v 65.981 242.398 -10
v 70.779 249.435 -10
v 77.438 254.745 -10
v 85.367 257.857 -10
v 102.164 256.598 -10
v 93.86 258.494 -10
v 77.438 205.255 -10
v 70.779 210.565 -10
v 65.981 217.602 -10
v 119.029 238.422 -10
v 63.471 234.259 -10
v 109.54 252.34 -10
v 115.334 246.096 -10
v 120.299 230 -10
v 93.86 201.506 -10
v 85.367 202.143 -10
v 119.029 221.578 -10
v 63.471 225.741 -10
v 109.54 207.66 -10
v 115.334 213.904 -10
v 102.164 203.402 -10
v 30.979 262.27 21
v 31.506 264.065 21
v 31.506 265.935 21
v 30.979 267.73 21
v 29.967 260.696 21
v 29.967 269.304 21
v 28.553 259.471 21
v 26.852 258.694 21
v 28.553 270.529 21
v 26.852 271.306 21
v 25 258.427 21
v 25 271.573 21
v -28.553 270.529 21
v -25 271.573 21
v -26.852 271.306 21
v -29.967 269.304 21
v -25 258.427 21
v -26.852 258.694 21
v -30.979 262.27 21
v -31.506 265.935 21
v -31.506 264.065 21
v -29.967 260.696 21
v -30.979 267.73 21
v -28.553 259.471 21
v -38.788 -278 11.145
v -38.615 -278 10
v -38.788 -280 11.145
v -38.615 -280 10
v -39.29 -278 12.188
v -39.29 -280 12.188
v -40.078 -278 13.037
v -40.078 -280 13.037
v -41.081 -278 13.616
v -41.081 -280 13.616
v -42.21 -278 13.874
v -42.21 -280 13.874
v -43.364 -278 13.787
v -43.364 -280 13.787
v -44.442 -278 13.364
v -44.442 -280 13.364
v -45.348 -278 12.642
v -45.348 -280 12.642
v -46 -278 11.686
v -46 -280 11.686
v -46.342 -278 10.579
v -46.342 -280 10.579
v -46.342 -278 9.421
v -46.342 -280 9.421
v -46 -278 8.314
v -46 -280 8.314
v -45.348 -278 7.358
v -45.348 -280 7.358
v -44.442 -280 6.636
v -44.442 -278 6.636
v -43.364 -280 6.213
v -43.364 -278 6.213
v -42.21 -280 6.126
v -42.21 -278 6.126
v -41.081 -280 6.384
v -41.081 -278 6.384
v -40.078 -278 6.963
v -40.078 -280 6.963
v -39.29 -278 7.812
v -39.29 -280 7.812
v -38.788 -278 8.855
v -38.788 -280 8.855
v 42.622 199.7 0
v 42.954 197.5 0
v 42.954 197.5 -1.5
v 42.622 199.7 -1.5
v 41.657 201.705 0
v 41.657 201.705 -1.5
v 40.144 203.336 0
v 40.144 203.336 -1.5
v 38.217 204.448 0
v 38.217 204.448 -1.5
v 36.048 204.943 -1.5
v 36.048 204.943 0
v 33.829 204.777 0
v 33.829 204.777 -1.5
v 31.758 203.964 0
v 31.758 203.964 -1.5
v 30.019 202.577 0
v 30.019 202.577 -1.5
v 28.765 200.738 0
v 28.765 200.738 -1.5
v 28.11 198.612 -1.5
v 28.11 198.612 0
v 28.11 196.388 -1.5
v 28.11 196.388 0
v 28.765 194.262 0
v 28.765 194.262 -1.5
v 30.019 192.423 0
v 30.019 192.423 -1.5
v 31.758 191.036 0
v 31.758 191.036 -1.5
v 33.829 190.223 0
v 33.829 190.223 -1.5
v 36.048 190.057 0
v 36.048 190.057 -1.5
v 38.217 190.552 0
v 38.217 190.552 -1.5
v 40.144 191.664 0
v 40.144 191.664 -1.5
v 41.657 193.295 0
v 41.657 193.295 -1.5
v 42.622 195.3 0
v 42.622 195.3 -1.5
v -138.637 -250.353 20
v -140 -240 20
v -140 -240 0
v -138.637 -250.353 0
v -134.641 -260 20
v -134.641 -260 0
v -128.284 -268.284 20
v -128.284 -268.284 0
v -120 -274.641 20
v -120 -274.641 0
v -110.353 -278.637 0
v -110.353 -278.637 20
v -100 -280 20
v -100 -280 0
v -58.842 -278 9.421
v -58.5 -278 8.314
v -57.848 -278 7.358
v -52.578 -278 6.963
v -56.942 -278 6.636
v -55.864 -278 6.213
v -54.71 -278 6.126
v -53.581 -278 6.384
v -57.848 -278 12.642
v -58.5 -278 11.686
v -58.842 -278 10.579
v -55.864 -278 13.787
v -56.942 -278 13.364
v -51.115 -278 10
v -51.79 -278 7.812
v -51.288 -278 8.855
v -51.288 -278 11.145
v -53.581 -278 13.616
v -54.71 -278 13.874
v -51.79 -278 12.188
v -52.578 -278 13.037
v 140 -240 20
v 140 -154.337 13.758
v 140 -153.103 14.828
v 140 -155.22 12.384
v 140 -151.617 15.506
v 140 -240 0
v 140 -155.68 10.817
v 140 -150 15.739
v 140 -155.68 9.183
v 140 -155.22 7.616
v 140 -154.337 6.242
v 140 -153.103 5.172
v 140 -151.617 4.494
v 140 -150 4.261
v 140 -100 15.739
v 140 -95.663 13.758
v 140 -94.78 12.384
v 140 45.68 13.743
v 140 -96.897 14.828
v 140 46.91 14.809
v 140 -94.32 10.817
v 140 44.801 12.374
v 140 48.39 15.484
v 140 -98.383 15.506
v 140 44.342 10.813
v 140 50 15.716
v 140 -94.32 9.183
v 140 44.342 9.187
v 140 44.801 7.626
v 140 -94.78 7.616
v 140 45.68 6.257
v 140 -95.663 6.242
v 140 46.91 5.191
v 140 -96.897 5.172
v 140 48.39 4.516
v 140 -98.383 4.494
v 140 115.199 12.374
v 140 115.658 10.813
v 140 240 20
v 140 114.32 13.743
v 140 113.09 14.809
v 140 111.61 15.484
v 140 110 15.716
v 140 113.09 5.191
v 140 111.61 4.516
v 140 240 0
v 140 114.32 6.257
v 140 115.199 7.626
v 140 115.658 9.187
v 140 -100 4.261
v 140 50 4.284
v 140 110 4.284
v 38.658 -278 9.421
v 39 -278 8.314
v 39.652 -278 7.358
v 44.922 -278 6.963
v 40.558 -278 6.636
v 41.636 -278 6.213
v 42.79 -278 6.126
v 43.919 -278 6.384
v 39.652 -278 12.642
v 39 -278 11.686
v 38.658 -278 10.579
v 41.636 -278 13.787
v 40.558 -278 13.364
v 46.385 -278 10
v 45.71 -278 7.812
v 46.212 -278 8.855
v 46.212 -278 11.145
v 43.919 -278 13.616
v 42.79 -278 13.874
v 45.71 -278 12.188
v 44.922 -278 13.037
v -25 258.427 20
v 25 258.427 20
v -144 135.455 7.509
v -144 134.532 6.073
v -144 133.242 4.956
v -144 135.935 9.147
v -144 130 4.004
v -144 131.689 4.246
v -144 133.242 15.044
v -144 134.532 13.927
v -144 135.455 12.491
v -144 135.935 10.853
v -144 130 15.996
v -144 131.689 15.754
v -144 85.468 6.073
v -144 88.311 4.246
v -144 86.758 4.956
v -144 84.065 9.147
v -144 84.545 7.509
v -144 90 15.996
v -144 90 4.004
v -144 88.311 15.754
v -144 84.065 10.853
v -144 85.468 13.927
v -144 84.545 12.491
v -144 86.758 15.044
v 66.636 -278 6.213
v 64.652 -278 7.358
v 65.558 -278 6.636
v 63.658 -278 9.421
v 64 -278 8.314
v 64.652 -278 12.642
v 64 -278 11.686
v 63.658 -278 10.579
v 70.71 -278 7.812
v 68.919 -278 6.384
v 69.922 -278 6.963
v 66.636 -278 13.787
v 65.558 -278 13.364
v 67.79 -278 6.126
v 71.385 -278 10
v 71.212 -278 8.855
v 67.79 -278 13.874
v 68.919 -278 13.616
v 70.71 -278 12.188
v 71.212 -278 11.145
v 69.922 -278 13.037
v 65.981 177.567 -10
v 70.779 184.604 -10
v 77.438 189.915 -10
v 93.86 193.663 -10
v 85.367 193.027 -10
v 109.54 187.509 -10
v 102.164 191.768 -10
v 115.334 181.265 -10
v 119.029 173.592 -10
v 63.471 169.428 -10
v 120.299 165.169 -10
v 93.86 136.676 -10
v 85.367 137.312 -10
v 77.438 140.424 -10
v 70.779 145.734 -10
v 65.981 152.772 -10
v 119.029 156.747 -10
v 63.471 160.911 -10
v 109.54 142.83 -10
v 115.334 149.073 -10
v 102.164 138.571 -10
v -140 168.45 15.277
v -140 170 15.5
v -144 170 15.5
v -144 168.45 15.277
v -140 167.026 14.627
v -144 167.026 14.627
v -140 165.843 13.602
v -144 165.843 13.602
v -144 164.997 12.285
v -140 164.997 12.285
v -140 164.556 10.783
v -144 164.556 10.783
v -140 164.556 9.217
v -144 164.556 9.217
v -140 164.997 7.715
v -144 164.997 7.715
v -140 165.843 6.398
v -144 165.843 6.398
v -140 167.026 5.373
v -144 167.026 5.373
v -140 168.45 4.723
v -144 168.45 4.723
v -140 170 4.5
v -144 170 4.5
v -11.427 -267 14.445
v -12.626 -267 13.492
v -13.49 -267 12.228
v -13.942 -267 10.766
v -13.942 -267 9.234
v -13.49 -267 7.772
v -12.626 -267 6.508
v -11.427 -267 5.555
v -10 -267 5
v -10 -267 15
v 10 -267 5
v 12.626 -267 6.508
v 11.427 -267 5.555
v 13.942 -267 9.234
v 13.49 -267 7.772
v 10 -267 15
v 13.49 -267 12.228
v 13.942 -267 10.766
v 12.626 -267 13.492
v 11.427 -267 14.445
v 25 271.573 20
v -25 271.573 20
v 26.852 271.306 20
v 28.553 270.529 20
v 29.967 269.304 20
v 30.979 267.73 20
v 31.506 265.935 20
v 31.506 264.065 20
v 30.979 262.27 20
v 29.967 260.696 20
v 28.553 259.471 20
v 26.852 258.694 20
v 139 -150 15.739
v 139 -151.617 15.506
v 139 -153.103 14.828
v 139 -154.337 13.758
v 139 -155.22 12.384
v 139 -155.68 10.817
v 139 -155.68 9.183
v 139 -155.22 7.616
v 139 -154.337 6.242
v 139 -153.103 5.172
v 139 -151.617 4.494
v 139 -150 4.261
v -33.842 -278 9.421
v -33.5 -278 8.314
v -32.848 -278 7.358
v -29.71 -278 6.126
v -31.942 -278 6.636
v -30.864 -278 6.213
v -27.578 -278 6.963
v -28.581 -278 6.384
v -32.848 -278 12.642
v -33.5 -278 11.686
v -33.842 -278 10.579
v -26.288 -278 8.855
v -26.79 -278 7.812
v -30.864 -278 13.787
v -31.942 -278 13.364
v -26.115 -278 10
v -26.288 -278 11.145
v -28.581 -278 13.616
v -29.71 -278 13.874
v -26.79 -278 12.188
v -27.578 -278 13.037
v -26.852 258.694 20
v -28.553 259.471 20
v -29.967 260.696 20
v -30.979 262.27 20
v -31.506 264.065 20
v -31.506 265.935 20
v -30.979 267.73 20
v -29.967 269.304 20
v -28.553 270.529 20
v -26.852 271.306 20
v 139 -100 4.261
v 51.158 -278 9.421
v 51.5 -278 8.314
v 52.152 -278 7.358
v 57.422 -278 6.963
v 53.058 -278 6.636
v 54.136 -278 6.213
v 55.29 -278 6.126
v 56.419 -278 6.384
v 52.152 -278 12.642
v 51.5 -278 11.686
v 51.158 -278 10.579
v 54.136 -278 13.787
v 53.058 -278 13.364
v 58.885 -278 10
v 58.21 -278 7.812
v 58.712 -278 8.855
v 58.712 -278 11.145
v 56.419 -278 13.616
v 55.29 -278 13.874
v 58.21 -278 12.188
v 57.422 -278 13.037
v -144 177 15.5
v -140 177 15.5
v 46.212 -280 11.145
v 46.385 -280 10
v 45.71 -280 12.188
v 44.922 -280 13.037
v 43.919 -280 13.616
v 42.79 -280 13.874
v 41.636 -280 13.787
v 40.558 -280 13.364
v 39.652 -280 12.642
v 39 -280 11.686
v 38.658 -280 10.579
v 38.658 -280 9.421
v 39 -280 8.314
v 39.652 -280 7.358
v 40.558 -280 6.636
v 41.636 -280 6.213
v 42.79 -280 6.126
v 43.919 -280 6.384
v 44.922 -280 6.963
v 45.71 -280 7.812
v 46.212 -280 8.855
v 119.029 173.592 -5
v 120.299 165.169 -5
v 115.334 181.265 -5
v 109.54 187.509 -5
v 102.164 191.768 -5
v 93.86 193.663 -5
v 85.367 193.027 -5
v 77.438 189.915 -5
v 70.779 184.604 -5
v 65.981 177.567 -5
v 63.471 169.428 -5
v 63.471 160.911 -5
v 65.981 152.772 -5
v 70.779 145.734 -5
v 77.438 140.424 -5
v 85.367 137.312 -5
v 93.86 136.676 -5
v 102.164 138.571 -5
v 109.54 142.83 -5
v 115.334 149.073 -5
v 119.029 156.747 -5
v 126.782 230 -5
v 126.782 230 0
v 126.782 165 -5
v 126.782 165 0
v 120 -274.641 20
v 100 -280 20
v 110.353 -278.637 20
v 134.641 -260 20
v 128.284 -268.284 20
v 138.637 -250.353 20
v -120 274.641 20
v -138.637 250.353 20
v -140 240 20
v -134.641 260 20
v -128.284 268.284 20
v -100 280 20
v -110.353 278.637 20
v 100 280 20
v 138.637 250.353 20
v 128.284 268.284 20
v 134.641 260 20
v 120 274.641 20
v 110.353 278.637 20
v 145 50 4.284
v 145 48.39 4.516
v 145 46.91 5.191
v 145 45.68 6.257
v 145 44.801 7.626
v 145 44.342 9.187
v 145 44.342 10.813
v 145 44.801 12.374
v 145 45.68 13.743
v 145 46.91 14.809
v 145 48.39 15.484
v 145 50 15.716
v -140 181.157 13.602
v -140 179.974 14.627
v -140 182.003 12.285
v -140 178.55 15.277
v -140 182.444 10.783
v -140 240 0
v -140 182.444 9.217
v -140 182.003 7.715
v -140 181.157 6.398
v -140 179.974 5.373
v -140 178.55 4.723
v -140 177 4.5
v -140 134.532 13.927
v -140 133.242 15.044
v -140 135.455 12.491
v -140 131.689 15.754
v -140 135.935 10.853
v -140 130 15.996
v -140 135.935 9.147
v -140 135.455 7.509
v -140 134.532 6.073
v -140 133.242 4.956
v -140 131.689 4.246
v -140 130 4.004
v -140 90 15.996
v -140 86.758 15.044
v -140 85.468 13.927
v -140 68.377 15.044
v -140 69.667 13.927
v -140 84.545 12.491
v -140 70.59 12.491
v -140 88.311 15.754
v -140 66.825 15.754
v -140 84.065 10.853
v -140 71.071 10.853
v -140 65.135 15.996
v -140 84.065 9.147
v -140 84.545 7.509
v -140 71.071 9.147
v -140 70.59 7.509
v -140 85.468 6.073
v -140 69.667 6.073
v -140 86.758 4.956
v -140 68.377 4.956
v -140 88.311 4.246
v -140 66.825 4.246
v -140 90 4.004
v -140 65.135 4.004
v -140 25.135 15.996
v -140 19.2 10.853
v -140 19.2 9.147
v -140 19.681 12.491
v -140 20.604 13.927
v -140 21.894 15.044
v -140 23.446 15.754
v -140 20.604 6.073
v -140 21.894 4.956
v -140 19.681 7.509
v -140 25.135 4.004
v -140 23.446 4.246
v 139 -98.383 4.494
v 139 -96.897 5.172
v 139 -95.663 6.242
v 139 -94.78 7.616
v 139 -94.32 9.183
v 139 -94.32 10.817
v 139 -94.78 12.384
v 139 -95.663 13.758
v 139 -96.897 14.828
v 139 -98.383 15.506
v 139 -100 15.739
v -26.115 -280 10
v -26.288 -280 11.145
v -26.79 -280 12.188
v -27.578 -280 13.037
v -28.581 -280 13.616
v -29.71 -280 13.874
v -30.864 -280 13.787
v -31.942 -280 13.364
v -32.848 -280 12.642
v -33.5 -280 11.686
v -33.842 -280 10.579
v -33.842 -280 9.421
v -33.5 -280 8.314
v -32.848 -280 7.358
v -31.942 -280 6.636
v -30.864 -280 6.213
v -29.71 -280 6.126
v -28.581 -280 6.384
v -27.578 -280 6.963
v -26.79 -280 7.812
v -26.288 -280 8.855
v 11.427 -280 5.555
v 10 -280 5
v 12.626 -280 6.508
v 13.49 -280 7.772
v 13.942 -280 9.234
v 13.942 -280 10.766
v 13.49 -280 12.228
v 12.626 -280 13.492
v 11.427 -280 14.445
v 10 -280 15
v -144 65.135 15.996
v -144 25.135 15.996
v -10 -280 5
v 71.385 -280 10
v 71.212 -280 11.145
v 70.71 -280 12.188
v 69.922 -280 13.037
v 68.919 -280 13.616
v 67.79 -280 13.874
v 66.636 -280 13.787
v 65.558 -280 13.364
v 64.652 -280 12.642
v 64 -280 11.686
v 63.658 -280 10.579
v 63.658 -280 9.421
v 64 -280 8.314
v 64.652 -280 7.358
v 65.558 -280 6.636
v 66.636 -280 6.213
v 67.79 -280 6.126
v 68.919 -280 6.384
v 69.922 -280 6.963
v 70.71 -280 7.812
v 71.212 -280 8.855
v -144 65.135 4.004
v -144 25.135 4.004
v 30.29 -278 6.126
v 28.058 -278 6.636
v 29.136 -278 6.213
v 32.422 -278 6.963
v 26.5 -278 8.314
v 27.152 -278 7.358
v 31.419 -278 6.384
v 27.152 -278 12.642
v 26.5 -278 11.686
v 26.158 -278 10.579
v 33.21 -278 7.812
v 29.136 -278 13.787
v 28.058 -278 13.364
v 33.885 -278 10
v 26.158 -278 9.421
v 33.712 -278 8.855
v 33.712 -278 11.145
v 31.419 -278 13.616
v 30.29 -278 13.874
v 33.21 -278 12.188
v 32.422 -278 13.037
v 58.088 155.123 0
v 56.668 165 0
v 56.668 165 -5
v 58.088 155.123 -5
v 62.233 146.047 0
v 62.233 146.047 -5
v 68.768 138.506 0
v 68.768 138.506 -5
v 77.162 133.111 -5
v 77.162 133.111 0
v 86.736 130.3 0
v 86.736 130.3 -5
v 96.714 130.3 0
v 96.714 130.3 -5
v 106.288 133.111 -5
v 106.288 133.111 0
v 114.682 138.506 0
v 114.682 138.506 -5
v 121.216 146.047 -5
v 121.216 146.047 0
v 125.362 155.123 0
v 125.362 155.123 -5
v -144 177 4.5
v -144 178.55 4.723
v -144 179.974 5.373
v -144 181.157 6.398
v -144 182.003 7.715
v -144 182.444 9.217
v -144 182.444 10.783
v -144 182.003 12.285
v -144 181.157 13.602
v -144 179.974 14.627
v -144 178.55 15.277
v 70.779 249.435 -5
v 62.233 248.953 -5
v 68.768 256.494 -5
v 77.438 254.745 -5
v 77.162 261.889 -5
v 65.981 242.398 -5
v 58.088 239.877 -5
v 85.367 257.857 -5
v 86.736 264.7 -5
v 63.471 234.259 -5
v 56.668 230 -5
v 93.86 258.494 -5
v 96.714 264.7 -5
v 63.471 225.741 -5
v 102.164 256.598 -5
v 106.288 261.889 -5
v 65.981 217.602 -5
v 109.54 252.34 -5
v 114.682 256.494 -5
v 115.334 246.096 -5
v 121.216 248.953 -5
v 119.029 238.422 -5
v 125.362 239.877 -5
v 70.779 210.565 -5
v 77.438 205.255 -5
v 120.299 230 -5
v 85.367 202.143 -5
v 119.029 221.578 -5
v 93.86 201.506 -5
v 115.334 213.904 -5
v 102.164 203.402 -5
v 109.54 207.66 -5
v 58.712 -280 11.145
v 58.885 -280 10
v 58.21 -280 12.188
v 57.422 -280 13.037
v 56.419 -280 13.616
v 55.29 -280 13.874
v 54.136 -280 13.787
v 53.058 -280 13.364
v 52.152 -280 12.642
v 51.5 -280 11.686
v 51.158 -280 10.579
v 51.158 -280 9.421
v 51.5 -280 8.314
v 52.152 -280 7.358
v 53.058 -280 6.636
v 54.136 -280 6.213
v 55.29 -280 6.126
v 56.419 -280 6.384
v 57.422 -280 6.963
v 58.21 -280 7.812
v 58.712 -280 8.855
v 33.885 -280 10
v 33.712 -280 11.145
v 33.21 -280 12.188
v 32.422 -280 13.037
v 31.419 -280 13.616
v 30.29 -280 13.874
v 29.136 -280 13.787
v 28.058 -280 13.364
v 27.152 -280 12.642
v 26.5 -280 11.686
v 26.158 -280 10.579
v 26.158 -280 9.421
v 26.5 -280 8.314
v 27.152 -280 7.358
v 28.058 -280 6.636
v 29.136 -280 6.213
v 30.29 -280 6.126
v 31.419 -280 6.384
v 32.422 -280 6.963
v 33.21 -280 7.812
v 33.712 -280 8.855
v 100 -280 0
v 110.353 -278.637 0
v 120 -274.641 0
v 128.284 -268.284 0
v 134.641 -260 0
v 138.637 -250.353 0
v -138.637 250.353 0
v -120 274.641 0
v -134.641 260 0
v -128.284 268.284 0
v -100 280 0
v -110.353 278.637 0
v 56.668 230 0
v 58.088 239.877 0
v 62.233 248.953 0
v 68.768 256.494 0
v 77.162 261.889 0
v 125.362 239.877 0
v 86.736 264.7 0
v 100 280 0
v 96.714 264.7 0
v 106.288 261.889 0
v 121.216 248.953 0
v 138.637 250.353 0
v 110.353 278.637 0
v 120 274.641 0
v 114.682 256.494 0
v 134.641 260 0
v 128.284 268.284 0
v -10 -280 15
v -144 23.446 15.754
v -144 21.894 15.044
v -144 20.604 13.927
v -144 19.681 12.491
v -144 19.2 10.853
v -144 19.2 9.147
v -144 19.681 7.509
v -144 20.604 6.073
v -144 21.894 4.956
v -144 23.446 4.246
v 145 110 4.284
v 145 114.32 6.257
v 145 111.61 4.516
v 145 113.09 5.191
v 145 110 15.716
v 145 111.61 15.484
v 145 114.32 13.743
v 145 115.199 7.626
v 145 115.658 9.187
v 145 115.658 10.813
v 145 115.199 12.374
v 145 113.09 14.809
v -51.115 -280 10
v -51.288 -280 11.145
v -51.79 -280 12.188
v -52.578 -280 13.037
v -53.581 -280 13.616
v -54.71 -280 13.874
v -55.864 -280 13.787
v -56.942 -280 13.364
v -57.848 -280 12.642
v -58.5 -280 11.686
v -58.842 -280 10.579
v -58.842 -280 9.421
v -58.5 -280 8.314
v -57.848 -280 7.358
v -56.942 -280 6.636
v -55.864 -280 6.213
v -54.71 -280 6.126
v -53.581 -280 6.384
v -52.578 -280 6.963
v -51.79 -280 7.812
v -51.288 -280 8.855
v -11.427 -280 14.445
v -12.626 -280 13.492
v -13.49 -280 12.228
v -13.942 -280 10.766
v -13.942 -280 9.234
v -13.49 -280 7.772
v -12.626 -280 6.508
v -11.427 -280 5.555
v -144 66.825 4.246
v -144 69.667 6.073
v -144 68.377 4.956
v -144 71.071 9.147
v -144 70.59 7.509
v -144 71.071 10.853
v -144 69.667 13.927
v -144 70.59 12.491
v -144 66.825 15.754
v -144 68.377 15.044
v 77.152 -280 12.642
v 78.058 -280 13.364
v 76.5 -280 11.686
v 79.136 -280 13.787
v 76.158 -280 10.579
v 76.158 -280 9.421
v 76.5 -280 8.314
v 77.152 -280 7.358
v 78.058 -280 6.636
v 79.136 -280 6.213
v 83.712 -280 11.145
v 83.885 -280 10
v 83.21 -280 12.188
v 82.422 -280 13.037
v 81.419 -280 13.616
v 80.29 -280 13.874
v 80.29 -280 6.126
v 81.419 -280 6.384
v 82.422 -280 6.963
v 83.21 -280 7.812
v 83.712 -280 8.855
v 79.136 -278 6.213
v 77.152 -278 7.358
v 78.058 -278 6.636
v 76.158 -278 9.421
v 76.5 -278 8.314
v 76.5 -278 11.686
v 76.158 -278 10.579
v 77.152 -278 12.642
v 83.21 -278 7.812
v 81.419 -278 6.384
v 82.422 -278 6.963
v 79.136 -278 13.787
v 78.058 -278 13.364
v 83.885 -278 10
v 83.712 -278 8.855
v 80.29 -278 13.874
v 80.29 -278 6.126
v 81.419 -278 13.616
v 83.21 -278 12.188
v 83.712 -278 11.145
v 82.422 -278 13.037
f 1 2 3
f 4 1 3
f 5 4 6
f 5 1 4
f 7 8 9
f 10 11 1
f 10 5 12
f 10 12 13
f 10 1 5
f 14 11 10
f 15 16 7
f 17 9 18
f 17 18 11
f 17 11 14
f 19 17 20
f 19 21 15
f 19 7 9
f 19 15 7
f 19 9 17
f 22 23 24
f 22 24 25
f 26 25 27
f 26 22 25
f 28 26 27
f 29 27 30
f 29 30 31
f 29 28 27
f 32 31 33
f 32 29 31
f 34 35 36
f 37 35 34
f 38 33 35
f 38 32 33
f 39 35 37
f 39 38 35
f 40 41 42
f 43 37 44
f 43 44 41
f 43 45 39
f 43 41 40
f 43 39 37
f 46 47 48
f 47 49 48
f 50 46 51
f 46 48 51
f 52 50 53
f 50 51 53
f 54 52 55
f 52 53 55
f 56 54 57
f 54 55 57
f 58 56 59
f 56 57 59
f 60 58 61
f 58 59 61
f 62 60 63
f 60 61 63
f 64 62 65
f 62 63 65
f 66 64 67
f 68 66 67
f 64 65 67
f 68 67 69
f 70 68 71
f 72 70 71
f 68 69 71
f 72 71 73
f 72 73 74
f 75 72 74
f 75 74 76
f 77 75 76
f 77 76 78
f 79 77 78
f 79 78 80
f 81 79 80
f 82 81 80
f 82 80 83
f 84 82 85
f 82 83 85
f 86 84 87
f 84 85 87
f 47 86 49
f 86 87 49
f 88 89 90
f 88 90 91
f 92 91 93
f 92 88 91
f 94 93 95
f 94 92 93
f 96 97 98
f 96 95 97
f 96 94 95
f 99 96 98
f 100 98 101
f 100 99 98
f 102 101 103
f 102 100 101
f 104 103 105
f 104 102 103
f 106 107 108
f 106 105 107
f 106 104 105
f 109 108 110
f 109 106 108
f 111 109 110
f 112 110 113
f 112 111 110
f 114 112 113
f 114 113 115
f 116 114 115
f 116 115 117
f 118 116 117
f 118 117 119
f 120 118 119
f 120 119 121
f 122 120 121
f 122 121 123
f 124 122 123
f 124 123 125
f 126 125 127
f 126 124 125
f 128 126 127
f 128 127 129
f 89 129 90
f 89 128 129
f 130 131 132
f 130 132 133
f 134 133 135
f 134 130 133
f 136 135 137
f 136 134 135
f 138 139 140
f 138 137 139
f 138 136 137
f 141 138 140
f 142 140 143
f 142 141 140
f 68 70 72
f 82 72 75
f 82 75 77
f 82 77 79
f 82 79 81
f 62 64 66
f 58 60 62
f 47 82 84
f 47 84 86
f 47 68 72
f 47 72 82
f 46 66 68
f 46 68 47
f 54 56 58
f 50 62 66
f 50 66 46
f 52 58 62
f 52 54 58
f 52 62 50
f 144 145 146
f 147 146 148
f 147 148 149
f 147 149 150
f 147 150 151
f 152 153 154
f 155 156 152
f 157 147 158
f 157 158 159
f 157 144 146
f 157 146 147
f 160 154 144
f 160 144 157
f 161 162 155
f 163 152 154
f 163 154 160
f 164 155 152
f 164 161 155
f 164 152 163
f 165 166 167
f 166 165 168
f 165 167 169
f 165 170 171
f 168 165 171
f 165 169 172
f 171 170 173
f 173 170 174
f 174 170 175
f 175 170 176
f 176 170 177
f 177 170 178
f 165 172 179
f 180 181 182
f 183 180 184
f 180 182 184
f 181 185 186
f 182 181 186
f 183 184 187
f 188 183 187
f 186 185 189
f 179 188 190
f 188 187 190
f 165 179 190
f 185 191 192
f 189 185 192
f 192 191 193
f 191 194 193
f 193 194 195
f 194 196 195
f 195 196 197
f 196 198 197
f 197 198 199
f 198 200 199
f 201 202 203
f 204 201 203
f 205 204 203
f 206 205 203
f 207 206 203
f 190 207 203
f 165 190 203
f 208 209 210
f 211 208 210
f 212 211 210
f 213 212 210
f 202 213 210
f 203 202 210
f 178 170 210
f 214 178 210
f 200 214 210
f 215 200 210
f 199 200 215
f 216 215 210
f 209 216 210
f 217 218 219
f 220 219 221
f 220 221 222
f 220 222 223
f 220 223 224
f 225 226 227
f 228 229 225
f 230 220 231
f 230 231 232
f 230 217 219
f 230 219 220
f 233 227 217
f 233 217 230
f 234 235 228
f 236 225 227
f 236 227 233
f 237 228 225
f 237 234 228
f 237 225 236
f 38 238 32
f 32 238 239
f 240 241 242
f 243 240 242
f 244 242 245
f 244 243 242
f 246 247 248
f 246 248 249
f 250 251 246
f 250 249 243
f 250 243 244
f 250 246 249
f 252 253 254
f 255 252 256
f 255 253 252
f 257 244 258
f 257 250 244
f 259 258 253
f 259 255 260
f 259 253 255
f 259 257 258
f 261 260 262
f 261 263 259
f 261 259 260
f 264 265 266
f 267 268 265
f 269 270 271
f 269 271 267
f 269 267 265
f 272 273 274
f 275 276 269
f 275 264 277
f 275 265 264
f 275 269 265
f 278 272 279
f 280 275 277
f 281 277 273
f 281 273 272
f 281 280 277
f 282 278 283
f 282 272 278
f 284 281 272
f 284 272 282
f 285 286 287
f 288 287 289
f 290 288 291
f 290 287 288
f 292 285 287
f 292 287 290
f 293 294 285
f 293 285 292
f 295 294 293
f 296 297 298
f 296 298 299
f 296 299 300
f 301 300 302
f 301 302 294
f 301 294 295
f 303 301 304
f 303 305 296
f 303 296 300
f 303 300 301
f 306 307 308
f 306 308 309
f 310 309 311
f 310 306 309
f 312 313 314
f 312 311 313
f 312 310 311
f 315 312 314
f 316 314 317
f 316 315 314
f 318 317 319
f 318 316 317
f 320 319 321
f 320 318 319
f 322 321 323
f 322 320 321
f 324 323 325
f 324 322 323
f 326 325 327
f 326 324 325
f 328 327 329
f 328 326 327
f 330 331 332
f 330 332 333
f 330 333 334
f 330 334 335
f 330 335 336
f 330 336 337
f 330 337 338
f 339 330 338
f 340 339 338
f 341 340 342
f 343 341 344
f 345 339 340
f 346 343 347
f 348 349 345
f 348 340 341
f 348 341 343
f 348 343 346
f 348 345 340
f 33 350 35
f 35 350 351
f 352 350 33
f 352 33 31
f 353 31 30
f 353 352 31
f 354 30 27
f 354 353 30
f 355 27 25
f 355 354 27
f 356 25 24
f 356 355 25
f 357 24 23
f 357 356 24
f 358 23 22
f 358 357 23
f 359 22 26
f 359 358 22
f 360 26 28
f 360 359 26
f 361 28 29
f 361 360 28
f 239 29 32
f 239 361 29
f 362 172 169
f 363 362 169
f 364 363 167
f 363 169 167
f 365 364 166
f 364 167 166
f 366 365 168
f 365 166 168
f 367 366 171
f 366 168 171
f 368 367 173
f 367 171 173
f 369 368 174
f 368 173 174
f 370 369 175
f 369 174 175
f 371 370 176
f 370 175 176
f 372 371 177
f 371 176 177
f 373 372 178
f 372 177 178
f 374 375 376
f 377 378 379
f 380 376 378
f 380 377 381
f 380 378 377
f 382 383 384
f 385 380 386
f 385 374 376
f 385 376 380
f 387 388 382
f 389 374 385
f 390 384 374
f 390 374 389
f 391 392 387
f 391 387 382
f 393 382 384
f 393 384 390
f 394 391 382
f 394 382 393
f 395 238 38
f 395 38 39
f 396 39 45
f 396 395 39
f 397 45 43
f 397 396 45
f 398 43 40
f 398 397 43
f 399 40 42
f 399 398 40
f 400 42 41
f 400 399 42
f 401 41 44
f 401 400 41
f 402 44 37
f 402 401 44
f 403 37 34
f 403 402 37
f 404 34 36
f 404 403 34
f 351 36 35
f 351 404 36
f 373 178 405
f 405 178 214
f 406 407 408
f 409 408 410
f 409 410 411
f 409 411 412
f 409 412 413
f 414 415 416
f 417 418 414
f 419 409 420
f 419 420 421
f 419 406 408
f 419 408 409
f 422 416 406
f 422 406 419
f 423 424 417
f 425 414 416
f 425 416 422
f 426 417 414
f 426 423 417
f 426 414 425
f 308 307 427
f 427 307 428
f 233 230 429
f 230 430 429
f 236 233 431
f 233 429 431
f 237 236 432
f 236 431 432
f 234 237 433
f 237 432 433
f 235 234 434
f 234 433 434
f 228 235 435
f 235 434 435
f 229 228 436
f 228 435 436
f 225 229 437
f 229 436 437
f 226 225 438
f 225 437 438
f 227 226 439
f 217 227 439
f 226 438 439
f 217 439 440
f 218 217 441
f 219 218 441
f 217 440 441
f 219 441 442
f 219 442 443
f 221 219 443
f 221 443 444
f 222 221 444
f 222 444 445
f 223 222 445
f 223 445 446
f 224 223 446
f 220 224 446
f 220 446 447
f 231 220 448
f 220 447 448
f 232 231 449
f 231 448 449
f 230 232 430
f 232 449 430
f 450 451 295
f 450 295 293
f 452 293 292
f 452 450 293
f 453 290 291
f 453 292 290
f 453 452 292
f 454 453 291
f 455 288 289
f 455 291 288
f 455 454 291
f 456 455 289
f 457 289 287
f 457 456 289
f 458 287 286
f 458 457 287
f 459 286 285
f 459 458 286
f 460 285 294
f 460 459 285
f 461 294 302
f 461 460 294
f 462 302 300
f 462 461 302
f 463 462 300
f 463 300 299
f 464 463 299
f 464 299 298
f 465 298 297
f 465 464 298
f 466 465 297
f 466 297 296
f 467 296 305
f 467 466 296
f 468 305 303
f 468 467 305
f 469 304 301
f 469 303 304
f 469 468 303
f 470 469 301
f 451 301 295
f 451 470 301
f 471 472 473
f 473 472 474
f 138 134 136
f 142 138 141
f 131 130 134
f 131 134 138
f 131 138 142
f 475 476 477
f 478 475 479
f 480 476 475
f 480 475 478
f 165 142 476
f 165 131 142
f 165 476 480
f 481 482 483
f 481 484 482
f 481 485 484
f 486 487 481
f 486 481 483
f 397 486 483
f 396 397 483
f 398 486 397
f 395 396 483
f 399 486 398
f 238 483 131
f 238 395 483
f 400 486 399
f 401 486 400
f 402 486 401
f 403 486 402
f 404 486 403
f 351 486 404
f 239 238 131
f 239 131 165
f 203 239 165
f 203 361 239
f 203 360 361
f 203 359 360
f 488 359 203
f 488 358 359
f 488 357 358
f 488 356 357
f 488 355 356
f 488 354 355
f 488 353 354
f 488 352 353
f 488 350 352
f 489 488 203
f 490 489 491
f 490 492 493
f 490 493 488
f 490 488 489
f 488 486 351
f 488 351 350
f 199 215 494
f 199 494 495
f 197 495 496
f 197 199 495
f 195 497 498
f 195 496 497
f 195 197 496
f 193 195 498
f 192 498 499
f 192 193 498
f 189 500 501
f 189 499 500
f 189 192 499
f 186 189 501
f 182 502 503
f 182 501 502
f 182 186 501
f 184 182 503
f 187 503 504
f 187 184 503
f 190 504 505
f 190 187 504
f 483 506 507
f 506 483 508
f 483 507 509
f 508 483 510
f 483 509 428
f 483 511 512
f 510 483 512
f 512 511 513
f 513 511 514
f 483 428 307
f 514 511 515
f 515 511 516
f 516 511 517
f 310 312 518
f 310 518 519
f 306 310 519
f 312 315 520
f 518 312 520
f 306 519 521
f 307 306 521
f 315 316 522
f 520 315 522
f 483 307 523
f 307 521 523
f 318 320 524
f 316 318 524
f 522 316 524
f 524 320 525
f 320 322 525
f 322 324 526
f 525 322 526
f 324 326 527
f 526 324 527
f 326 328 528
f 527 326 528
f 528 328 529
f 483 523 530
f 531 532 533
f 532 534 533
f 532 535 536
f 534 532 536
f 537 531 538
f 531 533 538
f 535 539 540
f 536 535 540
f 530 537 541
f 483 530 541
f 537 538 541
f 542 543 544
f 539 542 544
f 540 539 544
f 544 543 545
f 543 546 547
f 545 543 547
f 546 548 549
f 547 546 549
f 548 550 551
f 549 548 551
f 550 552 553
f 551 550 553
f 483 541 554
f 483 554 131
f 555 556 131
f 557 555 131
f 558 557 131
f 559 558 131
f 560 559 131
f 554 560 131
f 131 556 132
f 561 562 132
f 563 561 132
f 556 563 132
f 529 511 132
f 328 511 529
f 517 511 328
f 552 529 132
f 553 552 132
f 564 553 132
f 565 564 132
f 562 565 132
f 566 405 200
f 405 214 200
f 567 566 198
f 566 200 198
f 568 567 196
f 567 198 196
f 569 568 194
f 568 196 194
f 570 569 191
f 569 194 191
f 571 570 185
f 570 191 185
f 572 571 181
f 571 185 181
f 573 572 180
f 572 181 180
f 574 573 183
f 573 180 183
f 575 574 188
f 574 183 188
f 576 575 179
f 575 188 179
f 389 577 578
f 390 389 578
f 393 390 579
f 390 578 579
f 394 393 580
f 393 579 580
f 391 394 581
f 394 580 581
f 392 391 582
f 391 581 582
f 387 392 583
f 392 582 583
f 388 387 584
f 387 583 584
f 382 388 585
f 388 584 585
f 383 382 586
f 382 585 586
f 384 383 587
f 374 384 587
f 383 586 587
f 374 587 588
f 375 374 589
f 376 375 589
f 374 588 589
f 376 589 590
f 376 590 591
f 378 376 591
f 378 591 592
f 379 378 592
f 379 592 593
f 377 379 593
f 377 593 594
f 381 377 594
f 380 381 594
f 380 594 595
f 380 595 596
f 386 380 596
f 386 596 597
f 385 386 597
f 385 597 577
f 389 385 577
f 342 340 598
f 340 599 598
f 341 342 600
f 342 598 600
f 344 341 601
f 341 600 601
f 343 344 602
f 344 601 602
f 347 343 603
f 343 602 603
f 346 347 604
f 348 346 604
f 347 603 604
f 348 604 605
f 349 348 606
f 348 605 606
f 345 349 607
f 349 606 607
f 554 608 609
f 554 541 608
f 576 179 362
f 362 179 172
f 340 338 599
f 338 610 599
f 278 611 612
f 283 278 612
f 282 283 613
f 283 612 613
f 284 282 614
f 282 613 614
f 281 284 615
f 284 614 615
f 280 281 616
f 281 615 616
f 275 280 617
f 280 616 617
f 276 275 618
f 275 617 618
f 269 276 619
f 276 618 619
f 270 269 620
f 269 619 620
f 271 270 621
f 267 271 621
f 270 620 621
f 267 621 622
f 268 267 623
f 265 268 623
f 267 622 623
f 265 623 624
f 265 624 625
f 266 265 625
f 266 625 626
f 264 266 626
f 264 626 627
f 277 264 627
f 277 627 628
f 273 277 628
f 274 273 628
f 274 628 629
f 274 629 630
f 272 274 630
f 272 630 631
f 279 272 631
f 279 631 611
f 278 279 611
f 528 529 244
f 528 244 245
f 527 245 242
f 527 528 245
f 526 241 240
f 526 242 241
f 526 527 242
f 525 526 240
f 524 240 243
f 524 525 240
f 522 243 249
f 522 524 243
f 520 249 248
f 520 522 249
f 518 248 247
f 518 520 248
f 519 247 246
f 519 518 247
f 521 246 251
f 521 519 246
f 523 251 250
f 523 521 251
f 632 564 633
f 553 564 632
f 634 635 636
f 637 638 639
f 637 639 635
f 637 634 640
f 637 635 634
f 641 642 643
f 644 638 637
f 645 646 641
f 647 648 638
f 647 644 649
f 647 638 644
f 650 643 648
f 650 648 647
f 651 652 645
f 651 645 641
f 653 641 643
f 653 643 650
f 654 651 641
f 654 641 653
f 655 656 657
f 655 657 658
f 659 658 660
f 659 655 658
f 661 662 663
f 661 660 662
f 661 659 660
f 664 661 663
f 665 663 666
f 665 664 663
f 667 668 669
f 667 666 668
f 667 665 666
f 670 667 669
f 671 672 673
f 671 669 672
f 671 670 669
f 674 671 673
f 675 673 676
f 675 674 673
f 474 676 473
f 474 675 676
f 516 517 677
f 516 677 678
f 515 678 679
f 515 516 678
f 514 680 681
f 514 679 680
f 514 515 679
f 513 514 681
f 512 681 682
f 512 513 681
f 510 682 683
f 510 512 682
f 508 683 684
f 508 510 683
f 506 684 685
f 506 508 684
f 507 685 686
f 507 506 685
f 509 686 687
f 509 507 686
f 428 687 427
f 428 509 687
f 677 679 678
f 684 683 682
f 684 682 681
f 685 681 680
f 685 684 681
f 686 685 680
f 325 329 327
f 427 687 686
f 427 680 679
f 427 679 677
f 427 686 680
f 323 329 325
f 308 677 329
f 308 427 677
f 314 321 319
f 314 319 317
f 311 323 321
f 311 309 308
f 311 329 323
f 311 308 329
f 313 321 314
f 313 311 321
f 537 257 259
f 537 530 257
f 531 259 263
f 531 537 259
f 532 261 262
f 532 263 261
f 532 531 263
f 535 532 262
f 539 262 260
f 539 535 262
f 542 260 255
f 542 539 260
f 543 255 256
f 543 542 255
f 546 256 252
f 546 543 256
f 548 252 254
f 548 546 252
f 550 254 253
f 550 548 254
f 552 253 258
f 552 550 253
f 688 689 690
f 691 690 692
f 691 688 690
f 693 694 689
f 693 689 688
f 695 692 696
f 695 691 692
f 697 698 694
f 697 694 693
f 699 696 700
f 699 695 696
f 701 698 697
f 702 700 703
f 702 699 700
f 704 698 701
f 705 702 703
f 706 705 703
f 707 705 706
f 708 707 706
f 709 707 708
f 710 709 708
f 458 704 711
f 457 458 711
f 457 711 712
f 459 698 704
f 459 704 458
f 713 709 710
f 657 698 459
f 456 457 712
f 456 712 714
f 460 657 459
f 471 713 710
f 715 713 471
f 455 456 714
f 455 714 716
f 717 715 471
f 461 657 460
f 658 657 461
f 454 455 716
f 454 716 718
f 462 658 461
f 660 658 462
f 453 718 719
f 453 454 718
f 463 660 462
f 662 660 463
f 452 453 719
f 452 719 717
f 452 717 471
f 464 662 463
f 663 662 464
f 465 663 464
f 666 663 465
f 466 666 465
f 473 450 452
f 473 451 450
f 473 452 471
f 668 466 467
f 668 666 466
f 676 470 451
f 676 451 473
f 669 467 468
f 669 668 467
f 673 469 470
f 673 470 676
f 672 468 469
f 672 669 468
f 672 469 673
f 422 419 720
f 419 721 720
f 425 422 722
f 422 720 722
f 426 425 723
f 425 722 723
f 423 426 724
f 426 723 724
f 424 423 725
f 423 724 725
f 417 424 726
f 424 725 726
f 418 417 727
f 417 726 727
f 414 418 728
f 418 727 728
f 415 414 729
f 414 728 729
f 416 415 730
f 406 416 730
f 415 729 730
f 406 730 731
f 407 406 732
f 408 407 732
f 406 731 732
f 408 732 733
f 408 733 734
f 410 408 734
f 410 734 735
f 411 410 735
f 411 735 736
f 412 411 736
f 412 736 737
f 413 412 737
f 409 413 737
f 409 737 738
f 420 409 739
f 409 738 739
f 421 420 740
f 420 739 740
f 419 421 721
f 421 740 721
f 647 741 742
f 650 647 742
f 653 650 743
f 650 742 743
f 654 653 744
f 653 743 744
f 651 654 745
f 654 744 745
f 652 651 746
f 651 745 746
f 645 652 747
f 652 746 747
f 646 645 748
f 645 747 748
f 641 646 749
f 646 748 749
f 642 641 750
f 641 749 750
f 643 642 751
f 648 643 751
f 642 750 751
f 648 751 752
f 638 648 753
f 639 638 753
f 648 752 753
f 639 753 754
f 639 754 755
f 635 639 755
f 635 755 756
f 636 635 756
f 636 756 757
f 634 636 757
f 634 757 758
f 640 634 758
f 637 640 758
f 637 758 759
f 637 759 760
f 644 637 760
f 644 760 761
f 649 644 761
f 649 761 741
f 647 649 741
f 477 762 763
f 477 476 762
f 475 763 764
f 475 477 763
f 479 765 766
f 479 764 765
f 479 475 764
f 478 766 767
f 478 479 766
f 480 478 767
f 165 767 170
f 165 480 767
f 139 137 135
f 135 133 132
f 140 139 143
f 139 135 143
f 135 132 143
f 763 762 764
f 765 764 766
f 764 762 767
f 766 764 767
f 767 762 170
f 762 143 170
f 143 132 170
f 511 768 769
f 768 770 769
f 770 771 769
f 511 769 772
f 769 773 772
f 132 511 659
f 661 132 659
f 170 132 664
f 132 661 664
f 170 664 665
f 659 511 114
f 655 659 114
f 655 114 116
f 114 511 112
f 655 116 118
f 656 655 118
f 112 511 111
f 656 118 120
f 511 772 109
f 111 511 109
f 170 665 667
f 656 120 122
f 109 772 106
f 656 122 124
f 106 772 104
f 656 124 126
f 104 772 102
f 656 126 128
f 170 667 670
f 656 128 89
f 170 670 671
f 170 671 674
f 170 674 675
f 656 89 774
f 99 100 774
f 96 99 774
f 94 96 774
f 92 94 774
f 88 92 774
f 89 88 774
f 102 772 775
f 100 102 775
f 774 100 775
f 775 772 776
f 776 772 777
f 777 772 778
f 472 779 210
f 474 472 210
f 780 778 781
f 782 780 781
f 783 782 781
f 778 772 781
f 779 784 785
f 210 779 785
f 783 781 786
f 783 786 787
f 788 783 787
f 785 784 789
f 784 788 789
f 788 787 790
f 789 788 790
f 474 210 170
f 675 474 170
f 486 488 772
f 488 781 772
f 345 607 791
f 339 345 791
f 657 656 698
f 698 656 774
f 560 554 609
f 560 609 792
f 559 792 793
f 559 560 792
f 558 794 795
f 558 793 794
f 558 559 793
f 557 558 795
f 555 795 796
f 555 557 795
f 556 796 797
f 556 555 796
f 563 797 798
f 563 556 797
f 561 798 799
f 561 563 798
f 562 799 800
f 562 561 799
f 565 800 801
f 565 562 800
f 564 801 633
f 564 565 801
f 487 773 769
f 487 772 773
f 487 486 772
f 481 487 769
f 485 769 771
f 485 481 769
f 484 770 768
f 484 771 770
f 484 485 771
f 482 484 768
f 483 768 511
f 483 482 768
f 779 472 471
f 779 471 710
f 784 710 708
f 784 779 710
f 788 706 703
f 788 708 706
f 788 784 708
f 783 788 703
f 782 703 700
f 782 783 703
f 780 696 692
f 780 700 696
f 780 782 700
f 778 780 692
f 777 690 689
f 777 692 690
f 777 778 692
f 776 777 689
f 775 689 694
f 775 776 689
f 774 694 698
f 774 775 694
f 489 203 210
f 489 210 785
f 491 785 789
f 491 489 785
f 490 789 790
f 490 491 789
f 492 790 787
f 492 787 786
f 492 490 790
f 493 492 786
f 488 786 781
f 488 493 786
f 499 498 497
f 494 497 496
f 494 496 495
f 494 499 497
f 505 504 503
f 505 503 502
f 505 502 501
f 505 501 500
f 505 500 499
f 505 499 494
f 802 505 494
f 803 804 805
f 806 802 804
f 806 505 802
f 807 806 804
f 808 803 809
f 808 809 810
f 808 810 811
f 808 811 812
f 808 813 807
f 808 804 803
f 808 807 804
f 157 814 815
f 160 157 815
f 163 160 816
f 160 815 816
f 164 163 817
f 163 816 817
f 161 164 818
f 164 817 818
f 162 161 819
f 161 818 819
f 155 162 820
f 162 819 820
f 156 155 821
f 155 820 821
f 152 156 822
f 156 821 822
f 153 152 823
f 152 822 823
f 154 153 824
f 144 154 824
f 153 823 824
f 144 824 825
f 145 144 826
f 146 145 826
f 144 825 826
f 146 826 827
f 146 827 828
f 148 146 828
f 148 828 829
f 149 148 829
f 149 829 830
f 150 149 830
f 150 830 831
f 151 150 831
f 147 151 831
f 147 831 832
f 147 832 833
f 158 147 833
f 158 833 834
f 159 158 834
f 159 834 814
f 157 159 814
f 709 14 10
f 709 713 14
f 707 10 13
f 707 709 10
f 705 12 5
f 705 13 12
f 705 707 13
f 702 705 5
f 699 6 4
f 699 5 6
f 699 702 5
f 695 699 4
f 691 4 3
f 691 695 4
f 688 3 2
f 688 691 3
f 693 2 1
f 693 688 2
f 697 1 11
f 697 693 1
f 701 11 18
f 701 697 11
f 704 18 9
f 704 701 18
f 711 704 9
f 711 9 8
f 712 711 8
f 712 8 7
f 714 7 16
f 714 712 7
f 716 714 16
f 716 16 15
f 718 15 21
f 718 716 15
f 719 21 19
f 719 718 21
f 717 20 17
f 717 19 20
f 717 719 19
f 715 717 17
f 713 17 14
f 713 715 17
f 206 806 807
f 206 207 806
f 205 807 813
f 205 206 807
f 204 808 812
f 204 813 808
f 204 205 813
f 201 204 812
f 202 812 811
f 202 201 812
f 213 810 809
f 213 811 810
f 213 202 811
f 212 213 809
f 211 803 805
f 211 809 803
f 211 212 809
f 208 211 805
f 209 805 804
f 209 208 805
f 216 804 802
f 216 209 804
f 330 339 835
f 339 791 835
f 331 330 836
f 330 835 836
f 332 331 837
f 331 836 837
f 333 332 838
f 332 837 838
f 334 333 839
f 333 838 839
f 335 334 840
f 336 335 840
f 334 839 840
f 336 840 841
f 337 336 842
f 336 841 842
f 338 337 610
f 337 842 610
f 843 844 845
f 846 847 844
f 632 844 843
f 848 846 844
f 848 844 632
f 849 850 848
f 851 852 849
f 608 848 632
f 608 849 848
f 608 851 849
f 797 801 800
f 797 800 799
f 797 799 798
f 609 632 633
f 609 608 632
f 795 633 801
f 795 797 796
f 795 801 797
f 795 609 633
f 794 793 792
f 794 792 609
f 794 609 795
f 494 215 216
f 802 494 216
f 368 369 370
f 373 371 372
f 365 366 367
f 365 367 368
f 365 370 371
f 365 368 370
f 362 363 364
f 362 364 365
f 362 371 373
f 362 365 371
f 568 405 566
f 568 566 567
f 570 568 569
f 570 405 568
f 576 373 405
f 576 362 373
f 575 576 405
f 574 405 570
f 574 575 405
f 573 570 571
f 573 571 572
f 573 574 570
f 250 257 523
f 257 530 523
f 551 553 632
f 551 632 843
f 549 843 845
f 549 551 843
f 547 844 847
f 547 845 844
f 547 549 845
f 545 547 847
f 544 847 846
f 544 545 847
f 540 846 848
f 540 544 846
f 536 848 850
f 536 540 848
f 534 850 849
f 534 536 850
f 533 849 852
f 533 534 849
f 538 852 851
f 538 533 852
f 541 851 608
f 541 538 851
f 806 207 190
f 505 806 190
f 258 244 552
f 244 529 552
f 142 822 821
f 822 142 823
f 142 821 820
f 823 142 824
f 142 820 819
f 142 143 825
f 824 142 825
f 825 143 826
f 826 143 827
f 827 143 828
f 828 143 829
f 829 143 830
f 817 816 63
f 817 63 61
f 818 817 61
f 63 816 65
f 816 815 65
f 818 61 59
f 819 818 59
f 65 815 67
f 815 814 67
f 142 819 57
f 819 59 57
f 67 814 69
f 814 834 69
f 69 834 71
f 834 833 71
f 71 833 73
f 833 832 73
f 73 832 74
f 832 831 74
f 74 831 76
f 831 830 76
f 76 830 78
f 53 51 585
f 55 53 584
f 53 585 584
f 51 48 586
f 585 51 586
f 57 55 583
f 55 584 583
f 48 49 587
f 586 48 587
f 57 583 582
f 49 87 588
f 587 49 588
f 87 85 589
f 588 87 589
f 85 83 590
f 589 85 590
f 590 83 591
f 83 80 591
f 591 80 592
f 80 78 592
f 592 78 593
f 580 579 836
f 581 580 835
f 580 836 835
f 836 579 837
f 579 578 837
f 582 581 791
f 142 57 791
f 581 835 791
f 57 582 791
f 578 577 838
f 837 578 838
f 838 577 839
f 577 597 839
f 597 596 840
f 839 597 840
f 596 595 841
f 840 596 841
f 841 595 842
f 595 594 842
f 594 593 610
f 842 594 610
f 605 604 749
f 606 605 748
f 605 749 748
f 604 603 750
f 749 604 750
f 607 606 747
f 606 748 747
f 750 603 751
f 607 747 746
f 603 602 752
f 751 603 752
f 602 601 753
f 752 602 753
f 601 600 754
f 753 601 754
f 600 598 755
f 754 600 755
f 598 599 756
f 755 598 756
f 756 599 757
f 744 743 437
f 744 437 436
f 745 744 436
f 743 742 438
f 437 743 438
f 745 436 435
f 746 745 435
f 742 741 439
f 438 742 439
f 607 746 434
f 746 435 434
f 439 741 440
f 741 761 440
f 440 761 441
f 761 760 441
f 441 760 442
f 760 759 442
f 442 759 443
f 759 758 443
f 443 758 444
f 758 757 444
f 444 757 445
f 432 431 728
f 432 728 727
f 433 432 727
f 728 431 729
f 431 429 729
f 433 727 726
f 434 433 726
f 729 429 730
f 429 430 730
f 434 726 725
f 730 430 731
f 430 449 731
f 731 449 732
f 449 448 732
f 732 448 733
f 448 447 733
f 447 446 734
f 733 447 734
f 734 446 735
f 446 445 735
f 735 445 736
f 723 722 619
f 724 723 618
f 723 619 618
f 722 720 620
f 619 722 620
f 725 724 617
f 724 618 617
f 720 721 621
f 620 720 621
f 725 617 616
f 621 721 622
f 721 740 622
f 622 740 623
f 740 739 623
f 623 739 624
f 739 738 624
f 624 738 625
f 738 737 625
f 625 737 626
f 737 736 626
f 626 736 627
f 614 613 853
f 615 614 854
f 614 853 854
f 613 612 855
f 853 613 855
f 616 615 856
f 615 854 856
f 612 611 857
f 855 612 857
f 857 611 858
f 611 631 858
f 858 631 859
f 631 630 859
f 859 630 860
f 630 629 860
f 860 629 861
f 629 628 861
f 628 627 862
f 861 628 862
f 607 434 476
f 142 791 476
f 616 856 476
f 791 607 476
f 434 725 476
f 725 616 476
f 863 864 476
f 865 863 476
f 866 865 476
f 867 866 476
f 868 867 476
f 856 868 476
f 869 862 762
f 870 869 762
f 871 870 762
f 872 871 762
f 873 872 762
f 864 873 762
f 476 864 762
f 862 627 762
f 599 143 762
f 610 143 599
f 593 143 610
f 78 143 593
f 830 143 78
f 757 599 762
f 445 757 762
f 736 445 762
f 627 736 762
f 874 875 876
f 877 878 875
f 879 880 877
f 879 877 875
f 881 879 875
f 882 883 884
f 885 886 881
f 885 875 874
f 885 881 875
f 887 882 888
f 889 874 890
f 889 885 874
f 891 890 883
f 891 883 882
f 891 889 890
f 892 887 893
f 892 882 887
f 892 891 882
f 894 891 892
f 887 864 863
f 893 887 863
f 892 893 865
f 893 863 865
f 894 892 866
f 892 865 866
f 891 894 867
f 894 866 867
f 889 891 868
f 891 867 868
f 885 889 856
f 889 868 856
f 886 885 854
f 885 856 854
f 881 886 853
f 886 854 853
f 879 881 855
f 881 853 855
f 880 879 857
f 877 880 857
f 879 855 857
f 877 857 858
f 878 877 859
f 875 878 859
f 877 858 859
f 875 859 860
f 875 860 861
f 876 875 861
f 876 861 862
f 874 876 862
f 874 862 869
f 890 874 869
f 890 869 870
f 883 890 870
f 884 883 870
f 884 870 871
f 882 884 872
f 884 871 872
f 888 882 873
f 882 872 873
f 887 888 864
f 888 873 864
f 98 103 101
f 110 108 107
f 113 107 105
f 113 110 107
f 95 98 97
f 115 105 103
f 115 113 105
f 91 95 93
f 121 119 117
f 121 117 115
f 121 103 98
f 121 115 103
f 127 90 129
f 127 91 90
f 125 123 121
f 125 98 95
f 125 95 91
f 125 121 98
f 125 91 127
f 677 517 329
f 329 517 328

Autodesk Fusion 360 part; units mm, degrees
sketch "Sketch1" plane through (0, 0, 0) normal (0, 0, 1) x (1, 0, 0)
  line L0 (140, 280) -> (-140, 280)
  line L1 (-140, 280) -> (-140, -280)
  line L2 (-140, -280) -> (140, -280)
  line L3 (140, -280) -> (140, 280)
  line L4 (140, 280) -> (-140, -280) construction
  line L5 (-140, 280) -> (140, -280) construction
  dimension "d1" = 140
  dimension "d2" = 280
extrude "Extrude1" add sketch "Sketch1" along normal blind 20
fillet "Fillet1" radius 40 4 edges at (140, -280, 10) (-140, -280, 10) (140, 280, 10) (-140, 280, 10)
sketch "Sketch2" plane through (0, -280, 0) normal (0, -1, 0) x (1, 0, 0)
  line L0 (-100, 20) -> (-100, 0)
  line L1 (-100, 0) -> (100, 0)
  line L2 (100, 0) -> (100, 20)
  line L3 (100, 20) -> (-100, 20)
  line L4 (10, 15) -> (-10, 15)
  line L5 (-10, 5) -> (10, 5)
  line L6 (10, 15) -> (-10, 5) construction
  line L7 (-10, 15) -> (10, 5) construction
  arc A0 (10, 5) -> (10, 15) centre (8.875, 10) ccw
  line L8 (0, 15) -> (0, 5) construction
  arc A1 (-10, 15) -> (-10, 5) centre (-8.875, 10) ccw
  circle A2 centre (-30, 10) radius 3.8849
  circle A3 centre (-42.5, 10) radius 3.8849
  circle A4 centre (-55, 10) radius 3.8849
  circle A5 centre (30, 10) radius 3.8849
  circle A6 centre (42.5, 10) radius 3.8849
  circle A7 centre (55, 10) radius 3.8849
  circle A8 centre (67.5, 10) radius 3.8849
  circle A9 centre (80, 10) radius 3.8849
  point P0 (0, 10)
  dimension "d7" = 20
  dimension "d8" = 5.125
  dimension "d9" = 10
  dimension "d10" = 5
  dimension "d11" = 100
  dimension "d12" = 10
  dimension "d17" = -25
  dimension "d18" = 0
  dimension "d21" = 50
  dimension "d22" = 0
extrude "Extrude2" cut sketch "Sketch2" against normal blind 13 contours L4 L5 A0 A1
extrude "Extrude3" cut sketch "Sketch2" against normal blind 2 contours A2 | A3 | A4 | A5 | A6 | A7 | A8 | A9
sketch "Sketch3" plane through (140, 0, 0) normal (1, 0, 0) x (0, 1, 0)
  line L0 (240, 0) -> (240, 20)
  line L1 (240, 20) -> (-240, 20)
  line L2 (-240, 20) -> (-240, 0)
  line L3 (-240, 0) -> (240, 0)
  line L4 (-150, 4.2611) -> (-100, 4.2611)
  arc A0 (-100, 4.2611) -> (-100, 15.7389) centre (-100, 10) ccw
  line L5 (-100, 15.7389) -> (-150, 15.7389)
  arc A1 (-150, 15.7389) -> (-150, 4.2611) centre (-150, 10) ccw
  line L6 (-150, 10) -> (-100, 10) construction
  line L7 (50, 4.2841) -> (110, 4.2841)
  arc A2 (110, 4.2841) -> (110, 15.7159) centre (110, 10) ccw
  line L8 (110, 15.7159) -> (50, 15.7159)
  arc A3 (50, 15.7159) -> (50, 4.2841) centre (50, 10) ccw
  line L9 (50, 10) -> (110, 10) construction
  dimension "d27" = 11.4319
extrude "Extrude4" cut sketch "Sketch3" against normal blind 1 contours L4 A0 L5 A1
extrude "Extrude5" add sketch "Sketch3" along normal blind 5 contours L7 A2 L8 A3
sketch "Sketch4" plane through (-140, 0, 0) normal (-1, 0, 0) x (0, -1, 0)
  line L0 (-240, 20) -> (-240, 0)
  line L1 (-240, 0) -> (240, 0)
  line L2 (240, 0) -> (240, 20)
  line L3 (240, 20) -> (-240, 20)
  line L4 (-130, 4.0036) -> (-90, 4.0036)
  arc A0 (-90, 4.0036) -> (-90, 15.9964) centre (-90, 10) ccw
  line L5 (-90, 15.9964) -> (-130, 15.9964)
  arc A1 (-130, 15.9964) -> (-130, 4.0036) centre (-130, 10) ccw
  line L6 (-130, 10) -> (-90, 10) construction
  line L7 (-77.5677, 20) -> (-77.5677, 0) construction
  arc A2 (-65.1354, 15.9964) -> (-65.1354, 4.0036) centre (-65.1354, 10) ccw
  line L8 (-65.1354, 15.9964) -> (-25.1354, 15.9964)
  arc A3 (-25.1354, 4.0036) -> (-25.1354, 15.9964) centre (-25.1354, 10) ccw
  line L9 (-25.1354, 4.0036) -> (-65.1354, 4.0036)
  line L10 (-177, 4.5) -> (-170, 4.5)
  arc A4 (-170, 4.5) -> (-170, 15.5) centre (-170, 10) ccw
  line L11 (-170, 15.5) -> (-177, 15.5)
  arc A5 (-177, 15.5) -> (-177, 4.5) centre (-177, 10) ccw
  line L12 (-177, 10) -> (-170, 10) construction
  dimension "d30" = 40
  dimension "d31" = 11
extrude "Extrude6" add sketch "Sketch4" along normal blind 4 contours L4 A0 L5 A1 | A2 L8 A3 L9 | L10 A4 L11 A5
sketch "Sketch5" plane through (0, 0, 0) normal (0, 0, -1) x (1, 0, 0)
  arc A0 (-140, -240) -> (-100, -280) centre (-100, -240) ccw
  line L0 (-100, -280) -> (100, -280)
  arc A1 (100, -280) -> (140, -240) centre (100, -240) ccw
  line L1 (140, -240) -> (140, 240)
  arc A2 (140, 240) -> (100, 280) centre (100, 240) ccw
  line L2 (100, 280) -> (-100, 280)
  arc A3 (-100, 280) -> (-140, 240) centre (-100, 240) ccw
  line L3 (-140, 240) -> (-140, -240)
  line L4 (126.7816, -230) -> (126.7816, -165)
  arc A4 (126.7816, -165) -> (56.6683, -165) centre (91.725, -165) ccw
  line L5 (56.6683, -165) -> (56.6683, -230)
  arc A5 (56.6683, -230) -> (126.7816, -230) centre (91.725, -230) ccw
  line L6 (91.725, -230) -> (91.725, -165) construction
  dimension "d34" = 35.0567
  dimension "d36" = 75
  dimension "d38" = 50
extrude "Extrude7" add sketch "Sketch5" along normal blind 5 contours L4 A4 L5 A5
sketch "Sketch6" plane through (0, 0, -5) normal (0, 0, -1) x (1, 0, 0)
  arc A0 (56.6683, -230) -> (126.7816, -230) centre (91.725, -230) ccw
  line L0 (126.7816, -230) -> (126.7816, -165)
  arc A1 (126.7816, -165) -> (56.6683, -165) centre (91.725, -165) ccw
  line L1 (56.6683, -165) -> (56.6683, -230)
  circle A2 centre (91.725, -230) radius 28.5736
  line L2 (91.725, -197.5847) -> (60, -197.5847) construction
  circle A3 centre (91.725, -165.1693) radius 28.5736
extrude "Extrude8" add sketch "Sketch6" along normal blind 5 contours A2 | A3
sketch "Sketch7" plane through (0, 0, 0) normal (0, 0, -1) x (1, 0, 0)
  line L0 (56.6683, -230) -> (56.6683, -165)
  arc A0 (126.7816, -165) -> (56.6683, -165) centre (91.725, -165) ccw
  line L1 (126.7816, -165) -> (126.7816, -230)
  arc A1 (56.6683, -230) -> (126.7816, -230) centre (91.725, -230) ccw
  arc A2 (-140, -240) -> (-100, -280) centre (-100, -240) ccw
  line L2 (-100, -280) -> (100, -280)
  arc A3 (100, -280) -> (140, -240) centre (100, -240) ccw
  line L3 (140, -240) -> (140, 240)
  arc A4 (140, 240) -> (100, 280) centre (100, 240) ccw
  line L4 (100, 280) -> (-100, 280)
  arc A5 (-100, 280) -> (-140, 240) centre (-100, 240) ccw
  line L5 (-140, 240) -> (-140, -240)
  circle A6 centre (35.4902, -197.5) radius 7.4639
extrude "Extrude9" add sketch "Sketch7" along normal blind 1.5 contours A6
sketch "Sketch8" plane through (0, 0, 20) normal (0, 0, 1) x (-1, 0, 0)
  arc A0 (100, -280) -> (140, -240) centre (100, -240) ccw
  line L0 (140, -240) -> (140, 240)
  arc A1 (140, 240) -> (100, 280) centre (100, 240) ccw
  line L1 (100, 280) -> (-100, 280)
  arc A2 (-100, 280) -> (-140, 240) centre (-100, 240) ccw
  line L2 (-140, 240) -> (-140, -240)
  arc A3 (-140, -240) -> (-100, -280) centre (-100, -240) ccw
  line L3 (-100, -280) -> (100, -280)
  line L4 (25, -258.4273) -> (-25, -258.4273)
  arc A4 (-25, -258.4273) -> (-25, -271.5727) centre (-25, -265) ccw
  line L5 (-25, -271.5727) -> (25, -271.5727)
  arc A5 (25, -271.5727) -> (25, -258.4273) centre (25, -265) ccw
  line L6 (25, -265) -> (-25, -265) construction
extrude "Extrude10" add sketch "Sketch8" along normal blind 1 contours L4 A4 L5 A5
sketch "Sketch9" plane through (0, 0, 0) normal (0, 0, -1) x (1, 0, 0)
  circle A0 centre (35.4902, -197.5) radius 7.4639
  line L0 (56.6683, -230) -> (56.6683, -165)
  arc A1 (126.7816, -165) -> (56.6683, -165) centre (91.725, -165) ccw
  line L1 (126.7816, -165) -> (126.7816, -230)
  arc A2 (56.6683, -230) -> (126.7816, -230) centre (91.725, -230) ccw
  arc A3 (-140, -240) -> (-100, -280) centre (-100, -240) ccw
  line L2 (-100, -280) -> (100, -280)
  arc A4 (100, -280) -> (140, -240) centre (100, -240) ccw
  line L3 (140, -240) -> (140, 240)
  arc A5 (140, 240) -> (100, 280) centre (100, 240) ccw
  line L4 (100, 280) -> (-100, 280)
  arc A6 (-100, 280) -> (-140, 240) centre (-100, 240) ccw
  line L5 (-140, 240) -> (-140, -240)
  spline S0 degree 3 poles (-24.7768, 20.7597) (-21.4828, 25.6809) (-17.9903, 30.4831) (-12.6722, 30.5625) knots 0 0 0 0 1 1 1 1
  spline S1 degree 3 poles (-12.6722, 30.5625) (-7.354, 30.6815) (-5.6475, 27.4272) (0.385, 27.4272) knots 0 0 0 0 1 1 1 1
  spline S2 degree 3 poles (0.385, 27.4272) (6.4572, 27.4272) (8.3225, 30.4831) (13.363, 30.6815) knots 0 0 0 0 1 1 1 1
  spline S3 degree 3 poles (13.363, 30.6815) (18.562, 30.88) (22.4911, 25.4428) (25.8248, 20.6406) knots 0 0 0 0 1 1 1 1
  spline S4 degree 3 poles (25.8248, 20.6406) (32.6114, 10.8378) (37.8105, -7.22) (30.8255, -19.3644) knots 0 0 0 0 1 1 1 1
  spline S5 degree 3 poles (30.8255, -19.3644) (27.3726, -25.3969) (21.1814, -29.2069) (14.4742, -29.326) knots 0 0 0 0 1 1 1 1
  spline S6 degree 3 poles (14.4742, -29.326) (9.3941, -29.4053) (4.5522, -25.8731) (1.4169, -25.8731) knots 0 0 0 0 1 1 1 1
  spline S7 degree 3 poles (1.4169, -25.8731) (-1.6787, -25.8731) (-7.5525, -30.1197) (-13.704, -29.4847) knots 0 0 0 0 1 1 1 1
  spline S8 degree 3 poles (-13.704, -29.4847) (-16.2837, -29.3657) (-23.5068, -28.4528) (-28.1503, -21.6266) knots 0 0 0 0 1 1 1 1
  spline S9 degree 3 poles (-28.1503, -21.6266) (-27.7931, -21.3885) (-19.5381, -16.5466) (-19.6175, -6.5056) knots 0 0 0 0 1 1 1 1
  spline S10 degree 3 poles (-19.6175, -6.5056) (-19.7365, 5.48) (-30.1347, 9.4884) (-30.2537, 9.5281) knots 0 0 0 0 1 1 1 1
  spline S11 degree 3 poles (-30.2537, 9.5281) (-30.1347, 9.8059) (-28.5868, 15.2431) (-24.7768, 20.7597) knots 0 0 0 0 1 1 1 1
  spline S12 degree 3 poles (-2.1153, -42.7403) (-5.0125, -46.0344) (-9.8147, -48.5347) (-13.7834, -48.6935) knots 0 0 0 0 1 1 1 1
  spline S13 degree 3 poles (-13.7834, -48.6935) (-14.2993, -44.05) (-12.434, -39.3669) (-9.6559, -36.0331) knots 0 0 0 0 1 1 1 1
  spline S14 degree 3 poles (-9.6559, -36.0331) (-6.9175, -32.6597) (-2.3931, -30.0403) (2.0519, -30.3975) knots 0 0 0 0 1 1 1 1
  spline S15 degree 3 poles (2.0519, -30.3975) (2.6472, -34.9616) (0.4247, -39.7241) (-2.1153, -42.7403) knots 0 0 0 0 1 1 1 1
